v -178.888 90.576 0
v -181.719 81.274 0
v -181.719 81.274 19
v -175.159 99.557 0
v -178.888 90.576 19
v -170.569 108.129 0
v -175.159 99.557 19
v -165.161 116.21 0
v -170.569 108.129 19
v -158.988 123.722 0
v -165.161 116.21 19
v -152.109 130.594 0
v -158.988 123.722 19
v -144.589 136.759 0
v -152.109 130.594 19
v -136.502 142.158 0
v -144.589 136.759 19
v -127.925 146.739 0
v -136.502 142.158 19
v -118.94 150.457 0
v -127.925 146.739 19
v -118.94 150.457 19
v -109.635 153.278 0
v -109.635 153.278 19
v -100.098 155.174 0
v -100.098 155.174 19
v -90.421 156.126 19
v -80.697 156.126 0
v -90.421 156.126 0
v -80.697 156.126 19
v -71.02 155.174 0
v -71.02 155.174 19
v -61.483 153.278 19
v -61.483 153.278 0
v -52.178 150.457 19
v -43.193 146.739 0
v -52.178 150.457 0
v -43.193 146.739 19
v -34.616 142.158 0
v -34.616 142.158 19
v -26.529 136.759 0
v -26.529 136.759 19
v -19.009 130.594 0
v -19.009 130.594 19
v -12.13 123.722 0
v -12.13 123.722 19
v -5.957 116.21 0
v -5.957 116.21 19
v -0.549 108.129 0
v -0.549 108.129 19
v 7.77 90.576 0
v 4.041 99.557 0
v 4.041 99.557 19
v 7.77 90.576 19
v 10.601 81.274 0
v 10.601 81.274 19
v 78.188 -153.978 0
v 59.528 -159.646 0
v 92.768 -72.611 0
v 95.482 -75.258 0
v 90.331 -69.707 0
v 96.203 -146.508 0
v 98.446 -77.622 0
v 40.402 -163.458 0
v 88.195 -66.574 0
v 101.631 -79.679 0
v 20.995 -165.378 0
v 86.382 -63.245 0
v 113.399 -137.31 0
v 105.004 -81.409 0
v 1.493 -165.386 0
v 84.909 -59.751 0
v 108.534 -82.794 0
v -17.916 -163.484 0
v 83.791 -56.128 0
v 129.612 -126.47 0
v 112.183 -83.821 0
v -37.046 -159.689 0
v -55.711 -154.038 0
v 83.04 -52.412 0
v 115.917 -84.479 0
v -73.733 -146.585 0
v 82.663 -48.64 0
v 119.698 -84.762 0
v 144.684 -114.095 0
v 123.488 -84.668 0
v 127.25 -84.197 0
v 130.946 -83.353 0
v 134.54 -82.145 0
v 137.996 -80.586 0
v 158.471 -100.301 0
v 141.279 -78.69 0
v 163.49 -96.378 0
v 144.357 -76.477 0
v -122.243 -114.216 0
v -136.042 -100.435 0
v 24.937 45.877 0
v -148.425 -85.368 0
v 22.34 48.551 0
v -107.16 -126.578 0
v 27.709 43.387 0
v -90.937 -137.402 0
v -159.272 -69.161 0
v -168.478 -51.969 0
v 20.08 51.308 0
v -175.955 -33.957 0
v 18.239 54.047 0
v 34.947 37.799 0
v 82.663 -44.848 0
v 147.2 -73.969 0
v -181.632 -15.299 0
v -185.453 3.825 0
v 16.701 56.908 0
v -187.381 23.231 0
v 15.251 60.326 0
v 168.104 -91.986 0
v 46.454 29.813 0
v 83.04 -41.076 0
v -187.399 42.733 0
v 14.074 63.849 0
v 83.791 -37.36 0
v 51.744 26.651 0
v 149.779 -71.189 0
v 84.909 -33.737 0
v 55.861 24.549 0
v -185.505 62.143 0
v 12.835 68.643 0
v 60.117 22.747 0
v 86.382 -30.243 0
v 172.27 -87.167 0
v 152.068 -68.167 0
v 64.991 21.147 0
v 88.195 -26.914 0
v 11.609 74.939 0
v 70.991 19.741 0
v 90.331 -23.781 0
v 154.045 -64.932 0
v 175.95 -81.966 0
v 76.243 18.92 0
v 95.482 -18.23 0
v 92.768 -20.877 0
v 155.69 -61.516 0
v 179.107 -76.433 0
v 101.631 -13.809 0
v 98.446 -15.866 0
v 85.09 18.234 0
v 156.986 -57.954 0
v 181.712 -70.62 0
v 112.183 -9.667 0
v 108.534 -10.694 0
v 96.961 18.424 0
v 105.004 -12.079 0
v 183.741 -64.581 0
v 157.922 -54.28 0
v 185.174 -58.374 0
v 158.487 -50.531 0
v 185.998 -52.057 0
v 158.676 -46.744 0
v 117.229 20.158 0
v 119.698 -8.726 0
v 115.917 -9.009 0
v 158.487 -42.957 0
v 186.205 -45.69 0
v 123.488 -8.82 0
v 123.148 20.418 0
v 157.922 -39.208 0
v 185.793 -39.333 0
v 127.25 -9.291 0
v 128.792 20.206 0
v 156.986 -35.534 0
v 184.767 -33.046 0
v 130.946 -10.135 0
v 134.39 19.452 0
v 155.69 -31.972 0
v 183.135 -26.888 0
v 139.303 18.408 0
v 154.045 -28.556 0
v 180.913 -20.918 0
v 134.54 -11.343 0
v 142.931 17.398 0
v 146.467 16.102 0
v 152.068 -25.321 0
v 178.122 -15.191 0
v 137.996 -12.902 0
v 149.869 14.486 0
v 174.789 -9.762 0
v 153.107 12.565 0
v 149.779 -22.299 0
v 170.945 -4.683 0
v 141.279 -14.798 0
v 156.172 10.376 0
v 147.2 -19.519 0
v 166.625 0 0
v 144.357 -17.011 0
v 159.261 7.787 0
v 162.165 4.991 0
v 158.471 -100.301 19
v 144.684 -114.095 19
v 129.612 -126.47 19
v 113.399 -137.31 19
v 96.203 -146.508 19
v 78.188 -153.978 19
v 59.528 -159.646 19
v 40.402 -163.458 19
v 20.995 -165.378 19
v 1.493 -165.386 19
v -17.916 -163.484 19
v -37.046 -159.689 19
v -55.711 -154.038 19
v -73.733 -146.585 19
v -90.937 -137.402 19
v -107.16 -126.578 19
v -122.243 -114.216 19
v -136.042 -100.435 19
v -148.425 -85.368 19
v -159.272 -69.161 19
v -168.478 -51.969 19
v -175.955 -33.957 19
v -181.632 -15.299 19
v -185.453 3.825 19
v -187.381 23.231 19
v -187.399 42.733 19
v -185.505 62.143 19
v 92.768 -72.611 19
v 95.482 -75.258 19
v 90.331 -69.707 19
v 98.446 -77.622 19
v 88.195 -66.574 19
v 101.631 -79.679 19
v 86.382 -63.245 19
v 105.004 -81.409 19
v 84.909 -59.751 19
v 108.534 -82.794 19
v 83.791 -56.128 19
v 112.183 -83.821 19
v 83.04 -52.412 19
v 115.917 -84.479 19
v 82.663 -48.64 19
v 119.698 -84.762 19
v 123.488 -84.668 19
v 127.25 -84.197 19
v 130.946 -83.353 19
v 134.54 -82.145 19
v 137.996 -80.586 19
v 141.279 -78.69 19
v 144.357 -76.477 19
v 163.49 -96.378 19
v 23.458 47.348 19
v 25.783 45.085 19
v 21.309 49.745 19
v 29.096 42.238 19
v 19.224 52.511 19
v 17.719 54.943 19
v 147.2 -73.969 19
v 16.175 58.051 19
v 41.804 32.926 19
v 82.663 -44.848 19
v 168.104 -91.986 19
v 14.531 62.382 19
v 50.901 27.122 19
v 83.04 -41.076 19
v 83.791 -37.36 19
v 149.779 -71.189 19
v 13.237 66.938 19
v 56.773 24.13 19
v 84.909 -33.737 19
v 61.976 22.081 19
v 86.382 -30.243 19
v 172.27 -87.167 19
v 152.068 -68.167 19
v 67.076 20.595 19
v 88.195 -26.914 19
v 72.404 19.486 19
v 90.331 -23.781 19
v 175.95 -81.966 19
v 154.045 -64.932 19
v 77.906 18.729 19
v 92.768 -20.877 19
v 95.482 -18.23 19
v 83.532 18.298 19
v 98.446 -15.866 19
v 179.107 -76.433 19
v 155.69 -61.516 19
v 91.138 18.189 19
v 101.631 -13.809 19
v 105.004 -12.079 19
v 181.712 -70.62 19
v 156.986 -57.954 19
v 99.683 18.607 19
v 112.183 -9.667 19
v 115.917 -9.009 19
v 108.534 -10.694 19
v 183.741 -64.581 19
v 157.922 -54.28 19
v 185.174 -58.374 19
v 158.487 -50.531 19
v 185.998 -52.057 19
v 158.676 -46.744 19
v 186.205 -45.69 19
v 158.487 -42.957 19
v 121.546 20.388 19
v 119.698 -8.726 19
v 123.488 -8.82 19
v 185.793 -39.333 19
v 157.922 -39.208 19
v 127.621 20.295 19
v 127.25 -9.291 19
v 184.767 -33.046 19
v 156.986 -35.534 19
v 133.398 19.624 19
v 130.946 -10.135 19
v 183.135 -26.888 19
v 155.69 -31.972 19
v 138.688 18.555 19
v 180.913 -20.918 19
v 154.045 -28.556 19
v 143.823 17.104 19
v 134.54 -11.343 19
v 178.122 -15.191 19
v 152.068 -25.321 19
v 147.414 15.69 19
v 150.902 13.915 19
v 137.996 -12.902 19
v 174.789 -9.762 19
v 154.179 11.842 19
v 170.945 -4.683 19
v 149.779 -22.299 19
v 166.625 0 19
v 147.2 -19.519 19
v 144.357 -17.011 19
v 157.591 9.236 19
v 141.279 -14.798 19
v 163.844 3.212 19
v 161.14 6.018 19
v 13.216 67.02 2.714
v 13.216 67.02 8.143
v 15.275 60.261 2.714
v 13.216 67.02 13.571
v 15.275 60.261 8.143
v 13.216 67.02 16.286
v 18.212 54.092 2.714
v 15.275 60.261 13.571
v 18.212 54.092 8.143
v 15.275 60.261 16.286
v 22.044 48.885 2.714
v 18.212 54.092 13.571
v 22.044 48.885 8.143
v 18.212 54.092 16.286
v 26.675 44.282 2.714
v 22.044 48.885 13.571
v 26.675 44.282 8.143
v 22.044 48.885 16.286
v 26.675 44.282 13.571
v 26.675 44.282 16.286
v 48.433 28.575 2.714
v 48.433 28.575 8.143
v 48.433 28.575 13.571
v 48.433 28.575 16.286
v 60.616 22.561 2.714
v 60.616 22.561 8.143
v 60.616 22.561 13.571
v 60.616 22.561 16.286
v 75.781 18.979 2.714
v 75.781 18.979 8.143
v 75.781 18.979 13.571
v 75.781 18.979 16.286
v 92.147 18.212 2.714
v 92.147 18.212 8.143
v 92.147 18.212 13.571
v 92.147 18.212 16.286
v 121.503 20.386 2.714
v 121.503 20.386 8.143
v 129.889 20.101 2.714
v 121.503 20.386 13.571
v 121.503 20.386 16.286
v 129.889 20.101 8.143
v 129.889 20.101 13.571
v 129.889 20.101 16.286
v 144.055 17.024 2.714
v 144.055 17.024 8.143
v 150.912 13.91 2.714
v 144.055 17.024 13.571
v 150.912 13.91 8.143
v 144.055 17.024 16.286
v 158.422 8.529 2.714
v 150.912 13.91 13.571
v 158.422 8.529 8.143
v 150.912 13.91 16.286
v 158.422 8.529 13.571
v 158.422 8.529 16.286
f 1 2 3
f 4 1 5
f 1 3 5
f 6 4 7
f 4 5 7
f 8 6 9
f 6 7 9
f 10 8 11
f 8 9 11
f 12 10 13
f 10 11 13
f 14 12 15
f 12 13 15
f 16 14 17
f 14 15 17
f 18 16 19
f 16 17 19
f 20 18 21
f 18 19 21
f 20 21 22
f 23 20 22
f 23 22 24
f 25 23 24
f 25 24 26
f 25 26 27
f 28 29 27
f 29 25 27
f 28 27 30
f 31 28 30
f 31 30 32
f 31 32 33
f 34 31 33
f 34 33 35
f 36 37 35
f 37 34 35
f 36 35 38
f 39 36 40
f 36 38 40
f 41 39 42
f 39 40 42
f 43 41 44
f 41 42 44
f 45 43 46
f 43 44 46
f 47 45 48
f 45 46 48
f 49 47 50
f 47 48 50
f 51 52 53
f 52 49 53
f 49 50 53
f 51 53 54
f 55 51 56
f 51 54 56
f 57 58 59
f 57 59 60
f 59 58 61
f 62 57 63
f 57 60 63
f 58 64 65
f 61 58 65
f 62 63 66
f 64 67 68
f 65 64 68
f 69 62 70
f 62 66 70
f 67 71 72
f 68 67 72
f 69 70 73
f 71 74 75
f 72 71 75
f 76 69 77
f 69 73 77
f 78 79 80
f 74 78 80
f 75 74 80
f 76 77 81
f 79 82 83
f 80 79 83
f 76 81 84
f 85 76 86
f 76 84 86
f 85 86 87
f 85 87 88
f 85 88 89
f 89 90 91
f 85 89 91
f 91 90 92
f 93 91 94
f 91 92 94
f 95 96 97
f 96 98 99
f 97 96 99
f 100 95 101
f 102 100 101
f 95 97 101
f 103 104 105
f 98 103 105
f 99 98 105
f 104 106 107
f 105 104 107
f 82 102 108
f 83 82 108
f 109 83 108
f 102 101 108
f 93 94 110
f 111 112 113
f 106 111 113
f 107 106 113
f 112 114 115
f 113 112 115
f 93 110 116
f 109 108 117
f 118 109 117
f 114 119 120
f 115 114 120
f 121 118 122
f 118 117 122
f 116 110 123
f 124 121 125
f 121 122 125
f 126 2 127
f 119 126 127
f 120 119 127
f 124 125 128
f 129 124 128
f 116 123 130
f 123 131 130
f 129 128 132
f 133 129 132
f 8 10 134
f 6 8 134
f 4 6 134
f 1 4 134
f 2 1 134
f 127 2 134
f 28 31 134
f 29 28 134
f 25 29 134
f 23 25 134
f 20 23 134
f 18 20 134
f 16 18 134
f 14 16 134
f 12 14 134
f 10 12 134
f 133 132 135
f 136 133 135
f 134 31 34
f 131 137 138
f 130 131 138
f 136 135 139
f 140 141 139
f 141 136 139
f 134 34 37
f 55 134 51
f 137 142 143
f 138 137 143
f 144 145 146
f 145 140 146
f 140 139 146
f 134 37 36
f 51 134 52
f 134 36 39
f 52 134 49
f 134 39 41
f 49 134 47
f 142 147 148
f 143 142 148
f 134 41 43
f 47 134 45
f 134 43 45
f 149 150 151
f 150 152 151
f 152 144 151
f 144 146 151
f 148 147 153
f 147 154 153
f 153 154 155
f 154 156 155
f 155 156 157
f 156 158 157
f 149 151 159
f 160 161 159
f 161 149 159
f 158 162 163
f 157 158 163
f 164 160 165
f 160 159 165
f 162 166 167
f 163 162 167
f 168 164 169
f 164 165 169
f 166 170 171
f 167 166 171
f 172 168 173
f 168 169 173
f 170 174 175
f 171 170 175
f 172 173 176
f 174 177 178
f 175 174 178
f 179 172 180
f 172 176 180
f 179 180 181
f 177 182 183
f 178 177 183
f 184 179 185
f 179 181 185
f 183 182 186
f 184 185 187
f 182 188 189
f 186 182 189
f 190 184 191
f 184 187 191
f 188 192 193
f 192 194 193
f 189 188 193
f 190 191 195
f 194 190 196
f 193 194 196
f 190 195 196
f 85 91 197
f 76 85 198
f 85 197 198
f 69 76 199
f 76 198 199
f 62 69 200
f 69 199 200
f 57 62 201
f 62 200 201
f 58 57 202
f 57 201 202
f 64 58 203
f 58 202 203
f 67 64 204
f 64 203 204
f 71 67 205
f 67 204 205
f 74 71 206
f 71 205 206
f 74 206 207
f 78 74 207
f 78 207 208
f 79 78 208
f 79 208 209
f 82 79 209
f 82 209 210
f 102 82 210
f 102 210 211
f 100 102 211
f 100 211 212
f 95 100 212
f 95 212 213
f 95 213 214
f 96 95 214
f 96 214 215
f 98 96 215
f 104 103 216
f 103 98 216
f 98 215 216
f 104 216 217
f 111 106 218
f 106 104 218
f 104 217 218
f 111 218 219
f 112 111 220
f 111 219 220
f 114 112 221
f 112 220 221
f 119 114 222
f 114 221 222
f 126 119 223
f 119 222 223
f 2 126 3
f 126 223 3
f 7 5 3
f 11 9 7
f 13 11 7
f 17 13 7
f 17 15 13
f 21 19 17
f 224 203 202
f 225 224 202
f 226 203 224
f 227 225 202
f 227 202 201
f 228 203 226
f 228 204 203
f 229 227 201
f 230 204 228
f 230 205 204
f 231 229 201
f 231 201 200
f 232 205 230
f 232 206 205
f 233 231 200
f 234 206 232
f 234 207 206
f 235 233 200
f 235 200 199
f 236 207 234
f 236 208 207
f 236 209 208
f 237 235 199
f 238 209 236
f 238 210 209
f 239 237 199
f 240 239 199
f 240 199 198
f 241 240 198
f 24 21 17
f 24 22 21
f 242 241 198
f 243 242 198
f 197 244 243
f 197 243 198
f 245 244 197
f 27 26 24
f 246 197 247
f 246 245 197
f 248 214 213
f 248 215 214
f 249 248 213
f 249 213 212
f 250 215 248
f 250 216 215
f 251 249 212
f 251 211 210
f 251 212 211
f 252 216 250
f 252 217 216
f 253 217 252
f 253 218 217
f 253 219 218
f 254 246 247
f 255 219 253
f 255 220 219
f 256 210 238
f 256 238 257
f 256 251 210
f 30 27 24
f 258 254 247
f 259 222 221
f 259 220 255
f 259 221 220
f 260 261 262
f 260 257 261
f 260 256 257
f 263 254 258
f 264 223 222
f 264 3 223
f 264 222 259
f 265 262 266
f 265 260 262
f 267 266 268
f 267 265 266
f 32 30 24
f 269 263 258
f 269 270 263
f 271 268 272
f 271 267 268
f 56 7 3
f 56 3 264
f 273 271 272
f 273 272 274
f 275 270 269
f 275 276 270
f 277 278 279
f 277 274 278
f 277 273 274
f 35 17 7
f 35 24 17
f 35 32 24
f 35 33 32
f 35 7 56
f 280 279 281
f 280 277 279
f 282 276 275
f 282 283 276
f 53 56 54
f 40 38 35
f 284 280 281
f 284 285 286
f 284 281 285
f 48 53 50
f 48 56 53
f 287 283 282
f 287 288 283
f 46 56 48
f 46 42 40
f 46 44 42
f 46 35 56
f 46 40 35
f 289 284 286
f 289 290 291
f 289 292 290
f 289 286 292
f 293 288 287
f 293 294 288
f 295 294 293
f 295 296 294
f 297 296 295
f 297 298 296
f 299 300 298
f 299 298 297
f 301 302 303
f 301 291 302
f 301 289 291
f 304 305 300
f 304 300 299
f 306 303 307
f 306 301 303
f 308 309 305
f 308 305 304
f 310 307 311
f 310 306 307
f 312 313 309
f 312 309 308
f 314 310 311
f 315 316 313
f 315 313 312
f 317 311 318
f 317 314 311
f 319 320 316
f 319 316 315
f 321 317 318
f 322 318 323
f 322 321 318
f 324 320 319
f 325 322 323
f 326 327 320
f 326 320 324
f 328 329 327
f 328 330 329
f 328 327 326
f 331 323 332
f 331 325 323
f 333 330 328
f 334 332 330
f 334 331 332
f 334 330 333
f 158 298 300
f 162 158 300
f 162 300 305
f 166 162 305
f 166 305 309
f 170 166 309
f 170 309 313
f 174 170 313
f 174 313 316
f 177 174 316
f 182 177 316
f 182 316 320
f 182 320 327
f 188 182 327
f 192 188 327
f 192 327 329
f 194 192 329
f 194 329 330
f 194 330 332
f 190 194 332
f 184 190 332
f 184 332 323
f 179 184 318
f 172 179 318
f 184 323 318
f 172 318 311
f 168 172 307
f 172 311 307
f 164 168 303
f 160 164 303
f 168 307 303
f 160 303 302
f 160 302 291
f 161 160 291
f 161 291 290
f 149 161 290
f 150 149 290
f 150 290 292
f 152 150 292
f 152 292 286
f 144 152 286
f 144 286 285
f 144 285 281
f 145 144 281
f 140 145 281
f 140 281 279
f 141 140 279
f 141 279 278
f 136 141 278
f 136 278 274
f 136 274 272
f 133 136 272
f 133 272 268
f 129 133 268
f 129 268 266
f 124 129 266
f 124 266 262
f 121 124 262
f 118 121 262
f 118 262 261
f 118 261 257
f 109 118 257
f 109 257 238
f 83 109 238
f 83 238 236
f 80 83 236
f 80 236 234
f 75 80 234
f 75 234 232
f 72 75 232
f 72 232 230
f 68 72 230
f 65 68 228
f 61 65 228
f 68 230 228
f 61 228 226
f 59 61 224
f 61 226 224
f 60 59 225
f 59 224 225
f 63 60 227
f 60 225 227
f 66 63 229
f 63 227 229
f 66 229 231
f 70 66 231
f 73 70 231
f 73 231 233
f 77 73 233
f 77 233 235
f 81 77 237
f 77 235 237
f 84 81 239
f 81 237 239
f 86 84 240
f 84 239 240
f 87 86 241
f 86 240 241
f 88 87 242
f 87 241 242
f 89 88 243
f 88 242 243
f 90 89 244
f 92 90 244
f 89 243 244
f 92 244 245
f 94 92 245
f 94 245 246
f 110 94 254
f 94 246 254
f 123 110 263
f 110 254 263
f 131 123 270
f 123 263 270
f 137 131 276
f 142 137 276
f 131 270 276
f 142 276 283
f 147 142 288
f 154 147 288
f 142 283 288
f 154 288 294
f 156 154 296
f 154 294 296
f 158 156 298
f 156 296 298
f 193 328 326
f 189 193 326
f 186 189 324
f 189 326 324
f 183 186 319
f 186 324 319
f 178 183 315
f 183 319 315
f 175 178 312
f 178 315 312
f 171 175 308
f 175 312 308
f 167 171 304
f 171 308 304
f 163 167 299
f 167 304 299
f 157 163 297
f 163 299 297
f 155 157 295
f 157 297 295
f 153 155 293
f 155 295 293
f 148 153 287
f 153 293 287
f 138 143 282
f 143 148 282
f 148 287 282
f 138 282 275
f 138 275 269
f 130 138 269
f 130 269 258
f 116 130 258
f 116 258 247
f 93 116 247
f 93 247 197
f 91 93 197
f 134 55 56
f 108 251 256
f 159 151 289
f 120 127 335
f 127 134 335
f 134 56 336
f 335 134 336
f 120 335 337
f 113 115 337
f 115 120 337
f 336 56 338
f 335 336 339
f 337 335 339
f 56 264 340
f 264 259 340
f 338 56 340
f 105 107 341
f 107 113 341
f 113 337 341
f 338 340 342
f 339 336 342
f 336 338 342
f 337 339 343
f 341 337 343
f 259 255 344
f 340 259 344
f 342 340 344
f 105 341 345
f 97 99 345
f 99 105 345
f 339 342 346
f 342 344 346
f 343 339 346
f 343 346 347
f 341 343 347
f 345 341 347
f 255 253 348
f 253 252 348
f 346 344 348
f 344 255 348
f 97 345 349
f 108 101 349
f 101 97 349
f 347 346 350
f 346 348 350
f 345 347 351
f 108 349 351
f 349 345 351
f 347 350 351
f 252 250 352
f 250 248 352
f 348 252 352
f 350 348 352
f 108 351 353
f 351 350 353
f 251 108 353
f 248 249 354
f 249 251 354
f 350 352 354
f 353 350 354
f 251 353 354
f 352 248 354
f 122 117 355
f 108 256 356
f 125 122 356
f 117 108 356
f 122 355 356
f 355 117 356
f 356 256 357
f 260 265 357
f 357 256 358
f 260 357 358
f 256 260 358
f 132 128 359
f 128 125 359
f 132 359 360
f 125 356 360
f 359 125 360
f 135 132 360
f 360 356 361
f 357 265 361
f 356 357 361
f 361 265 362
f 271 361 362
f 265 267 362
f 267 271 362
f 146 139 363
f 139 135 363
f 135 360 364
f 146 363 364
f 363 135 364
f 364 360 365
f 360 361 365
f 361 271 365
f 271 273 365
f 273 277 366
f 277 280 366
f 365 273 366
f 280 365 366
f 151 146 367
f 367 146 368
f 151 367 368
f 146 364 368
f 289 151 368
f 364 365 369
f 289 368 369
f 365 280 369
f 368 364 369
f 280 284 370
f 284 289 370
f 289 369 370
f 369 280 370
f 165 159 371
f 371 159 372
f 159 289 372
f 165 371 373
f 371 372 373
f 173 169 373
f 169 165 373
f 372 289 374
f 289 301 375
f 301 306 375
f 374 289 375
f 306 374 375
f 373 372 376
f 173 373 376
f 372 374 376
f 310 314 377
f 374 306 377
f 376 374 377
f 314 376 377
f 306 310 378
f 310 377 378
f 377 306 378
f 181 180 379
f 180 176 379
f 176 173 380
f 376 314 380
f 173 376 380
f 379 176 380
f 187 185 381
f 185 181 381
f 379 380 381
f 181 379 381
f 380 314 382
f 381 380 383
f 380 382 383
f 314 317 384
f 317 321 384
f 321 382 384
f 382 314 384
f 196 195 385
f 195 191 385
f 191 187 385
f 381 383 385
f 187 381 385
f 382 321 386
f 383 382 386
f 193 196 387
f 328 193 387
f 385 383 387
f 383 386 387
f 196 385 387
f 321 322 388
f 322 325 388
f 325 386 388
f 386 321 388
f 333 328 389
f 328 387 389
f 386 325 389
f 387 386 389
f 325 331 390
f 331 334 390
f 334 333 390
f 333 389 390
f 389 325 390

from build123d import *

# Parameters (mm, degrees)
F0_W     = 400
F0_H     = 350
F1_DEPTH = 19
F2_W     = 400
F2_H     = 350
F3_DEPTH = 19.001
F4_R     = 38.0303111514
F5_DEPTH = 19.0010001


with BuildPart() as f1:
    # F0 (on Top) → F1 (new body)
    with BuildSketch(Plane.XY):
        Rectangle(F0_W, F0_H)
    extrude(amount=F1_DEPTH)

    # F2 (on face) → F3 (cut, through all)
    with BuildSketch(Plane.XY.offset(19)):
        Rectangle(F2_W, F2_H)
        with BuildLine():
            ThreePointArc((158.4707796574, -100.301399827), (-82.4477385445, -142.2049434954), (-181.7189997485, 81.2740400434))
            ThreePointArc((-181.7189997485, 81.2740400434), (-85.5590162079, 156.2453408499), (10.6009673327, 81.2740400434))
            add(Edge.make_bspline(
                [(10.6009673327, 81.2740400434), (12.0537158036, 71.790848631), (15.059544227, 52.1997014281), (37.4294986076, 35.9210738365), (59.8496179692, 20.1880319647), (91.7535141562, 16.7841239745), (121.2377669037, 21.3632017782), (139.2062429445, 19.1287691589), (155.2089601755, 13.8627961278), (166.6253805161, 0)],
                knots=[0, 0, 0, 0, 0.1451383216, 0.28483723, 0.426890771, 0.5810119484, 0.7292272805, 0.8398242455, 1, 1, 1, 1], degree=3))
            ThreePointArc((166.6253805161, 0), (185.9978425352, -52.0571882908), (158.4707796574, -100.301399827))
        make_face(mode=Mode.SUBTRACT)
    extrude(amount=-F3_DEPTH, mode=Mode.SUBTRACT)

    # F4 (on face) → F5 (cut, through all)
    with BuildSketch(Plane.XY.offset(19)):
        with Locations((120.645708, -46.7439965176)):
            Circle(F4_R)
    extrude(amount=-F5_DEPTH, mode=Mode.SUBTRACT)


solid = f1.part
